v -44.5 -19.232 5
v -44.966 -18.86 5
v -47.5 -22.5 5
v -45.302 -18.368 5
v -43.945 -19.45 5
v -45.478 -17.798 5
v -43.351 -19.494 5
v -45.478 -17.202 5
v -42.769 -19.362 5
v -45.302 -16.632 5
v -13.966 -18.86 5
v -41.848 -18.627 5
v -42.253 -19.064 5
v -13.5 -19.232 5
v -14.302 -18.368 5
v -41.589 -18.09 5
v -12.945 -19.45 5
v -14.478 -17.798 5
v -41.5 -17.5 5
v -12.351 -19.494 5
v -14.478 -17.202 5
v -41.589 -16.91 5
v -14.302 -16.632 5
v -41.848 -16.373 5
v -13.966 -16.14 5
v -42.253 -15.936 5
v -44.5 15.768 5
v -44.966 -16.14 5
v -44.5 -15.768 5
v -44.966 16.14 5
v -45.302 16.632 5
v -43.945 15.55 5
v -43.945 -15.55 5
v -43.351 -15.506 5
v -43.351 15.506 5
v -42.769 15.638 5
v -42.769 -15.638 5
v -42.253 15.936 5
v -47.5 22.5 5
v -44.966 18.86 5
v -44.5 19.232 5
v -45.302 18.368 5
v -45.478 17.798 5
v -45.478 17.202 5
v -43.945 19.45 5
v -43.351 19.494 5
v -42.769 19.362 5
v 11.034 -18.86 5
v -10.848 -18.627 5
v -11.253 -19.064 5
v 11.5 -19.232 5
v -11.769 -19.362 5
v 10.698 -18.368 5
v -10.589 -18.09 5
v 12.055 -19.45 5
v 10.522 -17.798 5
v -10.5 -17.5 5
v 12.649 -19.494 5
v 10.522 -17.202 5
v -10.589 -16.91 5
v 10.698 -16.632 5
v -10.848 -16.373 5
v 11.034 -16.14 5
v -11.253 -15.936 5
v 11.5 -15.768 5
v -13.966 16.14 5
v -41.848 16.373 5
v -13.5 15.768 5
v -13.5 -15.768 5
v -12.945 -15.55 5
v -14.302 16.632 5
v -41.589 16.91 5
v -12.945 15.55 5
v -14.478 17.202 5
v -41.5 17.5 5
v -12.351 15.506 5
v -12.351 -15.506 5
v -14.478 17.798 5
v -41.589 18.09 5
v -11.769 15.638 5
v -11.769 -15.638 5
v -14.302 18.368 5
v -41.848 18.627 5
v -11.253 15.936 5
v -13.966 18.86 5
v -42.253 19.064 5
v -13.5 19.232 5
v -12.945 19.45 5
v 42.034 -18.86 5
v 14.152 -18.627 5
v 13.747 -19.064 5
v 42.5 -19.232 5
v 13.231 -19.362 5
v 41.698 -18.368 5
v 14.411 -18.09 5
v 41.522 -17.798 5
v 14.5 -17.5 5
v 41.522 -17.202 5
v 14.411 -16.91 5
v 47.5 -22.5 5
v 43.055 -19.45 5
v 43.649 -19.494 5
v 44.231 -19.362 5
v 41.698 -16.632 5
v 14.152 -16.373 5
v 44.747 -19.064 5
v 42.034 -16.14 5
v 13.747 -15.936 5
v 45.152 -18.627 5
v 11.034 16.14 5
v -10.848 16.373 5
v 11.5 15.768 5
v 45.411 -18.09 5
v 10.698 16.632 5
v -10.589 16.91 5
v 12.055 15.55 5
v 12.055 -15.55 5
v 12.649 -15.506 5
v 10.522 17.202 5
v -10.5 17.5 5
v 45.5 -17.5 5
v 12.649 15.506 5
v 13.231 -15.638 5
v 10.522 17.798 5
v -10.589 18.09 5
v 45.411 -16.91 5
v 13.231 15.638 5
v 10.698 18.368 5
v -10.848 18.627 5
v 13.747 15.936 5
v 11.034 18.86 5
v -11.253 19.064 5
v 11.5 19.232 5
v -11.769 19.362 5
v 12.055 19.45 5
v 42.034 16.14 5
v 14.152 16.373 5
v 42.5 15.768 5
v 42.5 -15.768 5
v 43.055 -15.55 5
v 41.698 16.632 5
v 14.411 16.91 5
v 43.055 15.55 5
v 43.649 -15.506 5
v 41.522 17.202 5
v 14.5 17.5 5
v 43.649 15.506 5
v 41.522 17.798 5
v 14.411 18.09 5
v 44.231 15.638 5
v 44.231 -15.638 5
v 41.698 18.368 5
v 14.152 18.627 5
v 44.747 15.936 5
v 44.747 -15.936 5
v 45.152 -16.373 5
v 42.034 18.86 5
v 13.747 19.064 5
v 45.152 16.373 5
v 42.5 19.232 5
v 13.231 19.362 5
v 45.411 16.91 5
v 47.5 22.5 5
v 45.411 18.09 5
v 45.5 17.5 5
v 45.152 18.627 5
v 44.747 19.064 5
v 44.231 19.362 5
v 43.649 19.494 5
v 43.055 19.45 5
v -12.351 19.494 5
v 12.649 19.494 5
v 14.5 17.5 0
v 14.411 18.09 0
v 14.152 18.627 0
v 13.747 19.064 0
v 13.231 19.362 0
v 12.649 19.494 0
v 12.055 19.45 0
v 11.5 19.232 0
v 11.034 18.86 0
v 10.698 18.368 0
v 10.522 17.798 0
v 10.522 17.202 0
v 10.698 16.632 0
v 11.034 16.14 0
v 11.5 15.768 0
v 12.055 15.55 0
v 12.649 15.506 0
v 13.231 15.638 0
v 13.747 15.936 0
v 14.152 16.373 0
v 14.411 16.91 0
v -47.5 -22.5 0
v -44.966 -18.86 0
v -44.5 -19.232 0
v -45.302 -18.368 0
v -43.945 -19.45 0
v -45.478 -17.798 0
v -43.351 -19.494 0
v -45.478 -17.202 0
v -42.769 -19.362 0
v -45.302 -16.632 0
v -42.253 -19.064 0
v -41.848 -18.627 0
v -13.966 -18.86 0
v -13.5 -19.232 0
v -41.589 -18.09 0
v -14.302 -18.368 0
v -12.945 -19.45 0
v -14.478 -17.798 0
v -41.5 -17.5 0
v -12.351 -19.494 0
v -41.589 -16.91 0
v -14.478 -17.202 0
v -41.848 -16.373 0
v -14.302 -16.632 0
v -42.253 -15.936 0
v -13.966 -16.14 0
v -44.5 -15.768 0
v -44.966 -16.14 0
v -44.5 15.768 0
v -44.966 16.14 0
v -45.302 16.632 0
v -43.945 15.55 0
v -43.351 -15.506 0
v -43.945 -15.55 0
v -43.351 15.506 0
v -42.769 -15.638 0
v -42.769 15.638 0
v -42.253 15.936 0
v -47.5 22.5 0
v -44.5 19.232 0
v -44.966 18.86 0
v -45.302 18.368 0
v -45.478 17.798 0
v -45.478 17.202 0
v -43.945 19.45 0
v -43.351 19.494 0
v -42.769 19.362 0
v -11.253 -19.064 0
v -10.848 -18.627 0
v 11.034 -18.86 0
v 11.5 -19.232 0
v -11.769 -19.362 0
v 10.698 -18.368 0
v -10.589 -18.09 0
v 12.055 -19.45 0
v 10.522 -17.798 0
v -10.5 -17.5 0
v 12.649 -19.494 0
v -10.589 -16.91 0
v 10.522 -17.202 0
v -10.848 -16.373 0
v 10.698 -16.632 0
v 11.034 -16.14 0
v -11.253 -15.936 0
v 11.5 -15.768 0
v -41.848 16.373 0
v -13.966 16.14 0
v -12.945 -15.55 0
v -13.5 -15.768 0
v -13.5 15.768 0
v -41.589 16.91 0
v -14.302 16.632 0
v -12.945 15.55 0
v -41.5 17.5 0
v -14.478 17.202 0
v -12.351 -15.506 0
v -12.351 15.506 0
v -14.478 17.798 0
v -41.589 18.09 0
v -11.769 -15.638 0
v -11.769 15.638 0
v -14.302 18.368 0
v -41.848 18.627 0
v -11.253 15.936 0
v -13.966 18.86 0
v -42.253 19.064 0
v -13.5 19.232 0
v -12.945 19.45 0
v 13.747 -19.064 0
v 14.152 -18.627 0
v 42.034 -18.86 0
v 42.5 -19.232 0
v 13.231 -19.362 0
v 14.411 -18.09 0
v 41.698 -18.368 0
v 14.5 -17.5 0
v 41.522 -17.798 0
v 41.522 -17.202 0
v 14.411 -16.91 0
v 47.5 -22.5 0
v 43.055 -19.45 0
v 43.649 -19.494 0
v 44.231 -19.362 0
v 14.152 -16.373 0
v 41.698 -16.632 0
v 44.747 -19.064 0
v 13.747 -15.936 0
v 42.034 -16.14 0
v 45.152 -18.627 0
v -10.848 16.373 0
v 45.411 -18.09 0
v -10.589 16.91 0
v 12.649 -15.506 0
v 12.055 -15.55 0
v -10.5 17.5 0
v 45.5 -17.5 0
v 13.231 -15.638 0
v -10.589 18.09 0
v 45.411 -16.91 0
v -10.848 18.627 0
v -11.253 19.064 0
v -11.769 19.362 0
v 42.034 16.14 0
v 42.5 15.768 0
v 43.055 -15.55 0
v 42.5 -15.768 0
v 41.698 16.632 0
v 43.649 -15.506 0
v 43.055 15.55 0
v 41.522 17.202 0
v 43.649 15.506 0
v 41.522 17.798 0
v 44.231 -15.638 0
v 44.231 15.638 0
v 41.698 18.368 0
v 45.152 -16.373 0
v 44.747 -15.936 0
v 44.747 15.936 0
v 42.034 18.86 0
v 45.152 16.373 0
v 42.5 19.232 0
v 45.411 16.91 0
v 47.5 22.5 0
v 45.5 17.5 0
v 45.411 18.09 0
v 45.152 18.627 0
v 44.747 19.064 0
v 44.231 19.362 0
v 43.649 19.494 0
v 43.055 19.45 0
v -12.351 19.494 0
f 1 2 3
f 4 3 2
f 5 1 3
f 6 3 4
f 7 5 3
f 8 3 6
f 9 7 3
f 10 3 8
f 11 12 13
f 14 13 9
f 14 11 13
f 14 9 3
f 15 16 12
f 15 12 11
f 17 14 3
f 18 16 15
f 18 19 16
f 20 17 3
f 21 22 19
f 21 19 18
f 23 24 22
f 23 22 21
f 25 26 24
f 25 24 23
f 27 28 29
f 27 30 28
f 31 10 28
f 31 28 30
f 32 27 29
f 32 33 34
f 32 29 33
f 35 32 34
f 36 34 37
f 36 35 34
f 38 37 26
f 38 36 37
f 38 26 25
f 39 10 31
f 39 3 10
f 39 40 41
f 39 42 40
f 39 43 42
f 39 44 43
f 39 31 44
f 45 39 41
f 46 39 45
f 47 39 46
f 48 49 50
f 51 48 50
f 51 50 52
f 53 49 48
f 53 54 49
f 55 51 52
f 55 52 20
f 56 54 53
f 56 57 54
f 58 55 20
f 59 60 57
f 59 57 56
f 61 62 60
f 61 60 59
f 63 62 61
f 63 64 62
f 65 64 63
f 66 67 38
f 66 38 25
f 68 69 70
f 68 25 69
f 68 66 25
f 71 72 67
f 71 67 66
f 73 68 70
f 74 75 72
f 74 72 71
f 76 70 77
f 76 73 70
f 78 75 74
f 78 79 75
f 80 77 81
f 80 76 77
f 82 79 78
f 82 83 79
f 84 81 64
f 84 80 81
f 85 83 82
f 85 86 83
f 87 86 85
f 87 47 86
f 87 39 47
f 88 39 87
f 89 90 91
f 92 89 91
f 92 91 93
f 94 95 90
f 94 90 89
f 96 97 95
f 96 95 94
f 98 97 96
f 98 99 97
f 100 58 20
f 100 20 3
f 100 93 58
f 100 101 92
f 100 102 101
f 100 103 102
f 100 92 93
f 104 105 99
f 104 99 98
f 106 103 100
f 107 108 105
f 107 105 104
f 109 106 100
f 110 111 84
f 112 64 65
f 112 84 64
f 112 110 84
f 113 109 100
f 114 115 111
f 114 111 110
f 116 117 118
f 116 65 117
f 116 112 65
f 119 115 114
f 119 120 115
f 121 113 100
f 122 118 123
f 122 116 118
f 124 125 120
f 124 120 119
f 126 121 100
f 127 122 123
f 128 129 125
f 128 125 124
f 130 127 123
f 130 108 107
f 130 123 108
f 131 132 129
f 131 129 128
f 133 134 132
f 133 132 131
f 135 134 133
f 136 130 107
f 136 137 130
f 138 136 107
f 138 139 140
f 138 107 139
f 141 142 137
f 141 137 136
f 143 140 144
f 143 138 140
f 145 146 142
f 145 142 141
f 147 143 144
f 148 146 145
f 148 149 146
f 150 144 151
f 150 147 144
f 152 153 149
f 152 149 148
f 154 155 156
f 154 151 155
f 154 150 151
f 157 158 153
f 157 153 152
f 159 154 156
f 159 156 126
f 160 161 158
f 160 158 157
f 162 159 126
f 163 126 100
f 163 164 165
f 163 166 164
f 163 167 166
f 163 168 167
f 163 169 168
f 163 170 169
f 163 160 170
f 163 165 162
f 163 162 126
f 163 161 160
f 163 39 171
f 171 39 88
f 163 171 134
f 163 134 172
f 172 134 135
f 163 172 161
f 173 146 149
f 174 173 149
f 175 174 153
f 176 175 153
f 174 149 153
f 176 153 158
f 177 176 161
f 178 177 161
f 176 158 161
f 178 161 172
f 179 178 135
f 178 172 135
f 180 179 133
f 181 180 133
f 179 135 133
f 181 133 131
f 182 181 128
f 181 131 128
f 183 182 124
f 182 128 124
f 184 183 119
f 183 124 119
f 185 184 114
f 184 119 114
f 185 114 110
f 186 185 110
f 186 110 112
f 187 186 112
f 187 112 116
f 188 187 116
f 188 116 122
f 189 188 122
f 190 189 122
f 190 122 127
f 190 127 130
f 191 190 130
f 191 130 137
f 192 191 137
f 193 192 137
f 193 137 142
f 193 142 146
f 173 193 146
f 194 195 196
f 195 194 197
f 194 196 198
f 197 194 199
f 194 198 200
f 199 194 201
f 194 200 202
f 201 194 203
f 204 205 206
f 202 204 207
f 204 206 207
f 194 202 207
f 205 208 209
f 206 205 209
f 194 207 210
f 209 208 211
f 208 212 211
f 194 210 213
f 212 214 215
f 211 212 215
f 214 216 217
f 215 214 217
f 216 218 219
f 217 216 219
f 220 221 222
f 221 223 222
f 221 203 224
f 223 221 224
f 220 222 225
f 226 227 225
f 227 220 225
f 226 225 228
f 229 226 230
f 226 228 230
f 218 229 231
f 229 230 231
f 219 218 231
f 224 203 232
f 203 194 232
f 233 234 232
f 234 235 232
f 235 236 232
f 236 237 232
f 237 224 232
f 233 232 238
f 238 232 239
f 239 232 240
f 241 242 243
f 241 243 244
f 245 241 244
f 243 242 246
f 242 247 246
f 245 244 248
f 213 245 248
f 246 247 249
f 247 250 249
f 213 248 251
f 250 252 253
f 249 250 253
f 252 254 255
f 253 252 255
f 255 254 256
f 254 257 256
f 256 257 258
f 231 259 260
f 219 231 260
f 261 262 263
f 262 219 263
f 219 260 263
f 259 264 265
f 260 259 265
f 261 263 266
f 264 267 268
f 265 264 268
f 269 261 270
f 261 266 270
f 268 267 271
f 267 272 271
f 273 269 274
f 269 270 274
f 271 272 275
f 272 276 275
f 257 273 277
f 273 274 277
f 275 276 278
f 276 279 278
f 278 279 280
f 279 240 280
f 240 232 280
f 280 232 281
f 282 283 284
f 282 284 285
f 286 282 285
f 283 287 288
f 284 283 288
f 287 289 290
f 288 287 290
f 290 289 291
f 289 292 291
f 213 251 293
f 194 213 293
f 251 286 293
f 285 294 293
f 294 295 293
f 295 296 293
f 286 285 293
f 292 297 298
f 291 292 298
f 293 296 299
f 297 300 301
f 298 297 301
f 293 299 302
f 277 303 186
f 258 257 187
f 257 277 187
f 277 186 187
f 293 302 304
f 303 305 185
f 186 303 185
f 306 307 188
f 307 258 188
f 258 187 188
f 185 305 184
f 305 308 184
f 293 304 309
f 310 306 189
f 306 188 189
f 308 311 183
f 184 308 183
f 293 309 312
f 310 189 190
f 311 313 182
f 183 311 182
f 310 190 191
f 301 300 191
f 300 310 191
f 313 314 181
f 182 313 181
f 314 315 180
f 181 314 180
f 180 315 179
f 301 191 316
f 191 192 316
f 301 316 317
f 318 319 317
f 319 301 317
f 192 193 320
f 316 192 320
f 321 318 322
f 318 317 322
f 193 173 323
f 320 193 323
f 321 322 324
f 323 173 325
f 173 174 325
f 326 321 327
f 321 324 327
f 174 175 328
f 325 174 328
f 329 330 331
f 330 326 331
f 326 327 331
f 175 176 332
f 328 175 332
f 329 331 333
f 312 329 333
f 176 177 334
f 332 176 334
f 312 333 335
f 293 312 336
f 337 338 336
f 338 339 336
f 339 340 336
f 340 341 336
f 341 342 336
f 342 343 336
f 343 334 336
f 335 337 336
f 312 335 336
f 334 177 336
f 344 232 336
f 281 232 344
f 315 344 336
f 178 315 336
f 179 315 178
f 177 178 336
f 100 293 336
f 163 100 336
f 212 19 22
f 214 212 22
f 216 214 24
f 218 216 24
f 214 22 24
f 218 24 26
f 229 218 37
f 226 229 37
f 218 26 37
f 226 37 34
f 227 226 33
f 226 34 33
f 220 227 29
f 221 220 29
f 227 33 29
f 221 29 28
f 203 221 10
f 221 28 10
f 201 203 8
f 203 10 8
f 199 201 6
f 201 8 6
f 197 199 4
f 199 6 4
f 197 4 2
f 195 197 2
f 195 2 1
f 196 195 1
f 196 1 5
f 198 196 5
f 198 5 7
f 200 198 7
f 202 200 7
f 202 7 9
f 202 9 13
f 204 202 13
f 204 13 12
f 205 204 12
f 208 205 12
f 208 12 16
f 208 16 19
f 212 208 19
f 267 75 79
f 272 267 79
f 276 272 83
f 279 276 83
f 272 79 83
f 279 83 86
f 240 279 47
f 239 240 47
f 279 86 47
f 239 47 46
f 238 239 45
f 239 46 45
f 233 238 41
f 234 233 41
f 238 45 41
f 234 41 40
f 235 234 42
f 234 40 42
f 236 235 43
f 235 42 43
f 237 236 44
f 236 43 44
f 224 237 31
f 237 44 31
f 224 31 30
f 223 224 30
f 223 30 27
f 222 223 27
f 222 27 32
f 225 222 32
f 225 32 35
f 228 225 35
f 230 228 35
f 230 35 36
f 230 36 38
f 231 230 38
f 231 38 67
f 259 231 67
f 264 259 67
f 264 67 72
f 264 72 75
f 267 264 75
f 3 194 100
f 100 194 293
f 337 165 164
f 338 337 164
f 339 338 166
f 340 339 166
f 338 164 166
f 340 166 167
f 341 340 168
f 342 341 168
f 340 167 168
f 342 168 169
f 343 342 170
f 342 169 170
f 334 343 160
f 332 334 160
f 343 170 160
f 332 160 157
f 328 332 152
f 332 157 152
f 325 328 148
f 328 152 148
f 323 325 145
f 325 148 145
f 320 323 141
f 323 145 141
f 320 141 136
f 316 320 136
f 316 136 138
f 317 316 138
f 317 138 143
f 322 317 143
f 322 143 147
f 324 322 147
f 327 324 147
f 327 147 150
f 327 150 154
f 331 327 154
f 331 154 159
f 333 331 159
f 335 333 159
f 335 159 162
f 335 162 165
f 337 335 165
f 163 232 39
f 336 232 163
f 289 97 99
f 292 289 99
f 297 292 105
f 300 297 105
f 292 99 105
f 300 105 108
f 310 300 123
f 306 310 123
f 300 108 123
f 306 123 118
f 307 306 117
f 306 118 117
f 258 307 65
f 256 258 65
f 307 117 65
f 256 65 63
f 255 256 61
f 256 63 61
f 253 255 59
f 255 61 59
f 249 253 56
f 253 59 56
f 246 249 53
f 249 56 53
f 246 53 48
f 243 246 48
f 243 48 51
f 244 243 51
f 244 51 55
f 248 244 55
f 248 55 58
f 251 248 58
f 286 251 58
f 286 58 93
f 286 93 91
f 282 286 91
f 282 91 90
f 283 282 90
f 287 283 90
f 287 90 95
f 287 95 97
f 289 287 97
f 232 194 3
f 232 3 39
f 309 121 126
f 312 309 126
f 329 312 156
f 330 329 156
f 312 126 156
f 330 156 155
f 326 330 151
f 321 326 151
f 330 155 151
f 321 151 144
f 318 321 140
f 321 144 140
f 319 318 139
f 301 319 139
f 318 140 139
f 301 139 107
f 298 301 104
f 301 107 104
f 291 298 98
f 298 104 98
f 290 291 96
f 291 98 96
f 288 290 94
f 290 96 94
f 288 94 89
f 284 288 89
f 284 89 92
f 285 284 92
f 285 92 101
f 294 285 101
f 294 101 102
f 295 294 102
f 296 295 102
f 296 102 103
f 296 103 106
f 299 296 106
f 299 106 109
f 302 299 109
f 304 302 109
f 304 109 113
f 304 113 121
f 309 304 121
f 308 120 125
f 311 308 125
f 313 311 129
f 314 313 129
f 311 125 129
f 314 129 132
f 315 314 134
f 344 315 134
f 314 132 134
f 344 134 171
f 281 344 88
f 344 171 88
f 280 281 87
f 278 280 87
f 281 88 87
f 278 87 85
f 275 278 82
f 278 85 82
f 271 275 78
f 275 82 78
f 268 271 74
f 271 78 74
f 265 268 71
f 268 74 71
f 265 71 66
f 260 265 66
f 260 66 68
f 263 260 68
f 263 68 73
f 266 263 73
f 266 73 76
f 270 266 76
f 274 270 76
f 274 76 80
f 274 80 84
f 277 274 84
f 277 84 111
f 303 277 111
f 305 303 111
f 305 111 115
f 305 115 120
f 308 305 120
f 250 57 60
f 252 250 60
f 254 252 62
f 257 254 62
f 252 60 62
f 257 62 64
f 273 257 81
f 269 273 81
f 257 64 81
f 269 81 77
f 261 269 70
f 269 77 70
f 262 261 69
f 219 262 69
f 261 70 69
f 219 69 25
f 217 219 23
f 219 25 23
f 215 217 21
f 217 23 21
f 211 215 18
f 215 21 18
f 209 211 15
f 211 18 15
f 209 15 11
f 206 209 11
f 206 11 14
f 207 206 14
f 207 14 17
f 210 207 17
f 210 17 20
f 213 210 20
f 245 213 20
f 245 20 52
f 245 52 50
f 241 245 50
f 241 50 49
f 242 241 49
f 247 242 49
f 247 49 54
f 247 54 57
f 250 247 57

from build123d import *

# Parameters (mm, degrees)
SKETCH1_W           = 95
SKETCH1_H           = 45
BOSS_EXTRUDE1_DEPTH = 5
SKETCH2_R           = 2
CUT_EXTRUDE1_DEPTH  = 6


with BuildPart() as part:
    # Sketch1 → Boss-Extrude1 (new body)
    with BuildSketch(Plane.XY):
        Rectangle(SKETCH1_W, SKETCH1_H)
    extrude(amount=BOSS_EXTRUDE1_DEPTH)

    # Sketch2 → Cut-Extrude1 (cut, through all)
    with BuildSketch(Plane.XY.offset(5)):
        with Locations((43.5, 17.5)):
            Circle(SKETCH2_R)
        with Locations((43.5, -17.5)):
            Circle(SKETCH2_R)
        with Locations((12.5, -17.5)):
            Circle(SKETCH2_R)
        with Locations((12.5, 17.5)):
            Circle(SKETCH2_R)
        with Locations((-12.5, 17.5)):
            Circle(SKETCH2_R)
        with Locations((-12.5, -17.5)):
            Circle(SKETCH2_R)
        with Locations((-43.5, -17.5)):
            Circle(SKETCH2_R)
        with Locations((-43.5, 17.5)):
            Circle(SKETCH2_R)
    extrude(amount=-CUT_EXTRUDE1_DEPTH, mode=Mode.SUBTRACT)


solid = part.part
